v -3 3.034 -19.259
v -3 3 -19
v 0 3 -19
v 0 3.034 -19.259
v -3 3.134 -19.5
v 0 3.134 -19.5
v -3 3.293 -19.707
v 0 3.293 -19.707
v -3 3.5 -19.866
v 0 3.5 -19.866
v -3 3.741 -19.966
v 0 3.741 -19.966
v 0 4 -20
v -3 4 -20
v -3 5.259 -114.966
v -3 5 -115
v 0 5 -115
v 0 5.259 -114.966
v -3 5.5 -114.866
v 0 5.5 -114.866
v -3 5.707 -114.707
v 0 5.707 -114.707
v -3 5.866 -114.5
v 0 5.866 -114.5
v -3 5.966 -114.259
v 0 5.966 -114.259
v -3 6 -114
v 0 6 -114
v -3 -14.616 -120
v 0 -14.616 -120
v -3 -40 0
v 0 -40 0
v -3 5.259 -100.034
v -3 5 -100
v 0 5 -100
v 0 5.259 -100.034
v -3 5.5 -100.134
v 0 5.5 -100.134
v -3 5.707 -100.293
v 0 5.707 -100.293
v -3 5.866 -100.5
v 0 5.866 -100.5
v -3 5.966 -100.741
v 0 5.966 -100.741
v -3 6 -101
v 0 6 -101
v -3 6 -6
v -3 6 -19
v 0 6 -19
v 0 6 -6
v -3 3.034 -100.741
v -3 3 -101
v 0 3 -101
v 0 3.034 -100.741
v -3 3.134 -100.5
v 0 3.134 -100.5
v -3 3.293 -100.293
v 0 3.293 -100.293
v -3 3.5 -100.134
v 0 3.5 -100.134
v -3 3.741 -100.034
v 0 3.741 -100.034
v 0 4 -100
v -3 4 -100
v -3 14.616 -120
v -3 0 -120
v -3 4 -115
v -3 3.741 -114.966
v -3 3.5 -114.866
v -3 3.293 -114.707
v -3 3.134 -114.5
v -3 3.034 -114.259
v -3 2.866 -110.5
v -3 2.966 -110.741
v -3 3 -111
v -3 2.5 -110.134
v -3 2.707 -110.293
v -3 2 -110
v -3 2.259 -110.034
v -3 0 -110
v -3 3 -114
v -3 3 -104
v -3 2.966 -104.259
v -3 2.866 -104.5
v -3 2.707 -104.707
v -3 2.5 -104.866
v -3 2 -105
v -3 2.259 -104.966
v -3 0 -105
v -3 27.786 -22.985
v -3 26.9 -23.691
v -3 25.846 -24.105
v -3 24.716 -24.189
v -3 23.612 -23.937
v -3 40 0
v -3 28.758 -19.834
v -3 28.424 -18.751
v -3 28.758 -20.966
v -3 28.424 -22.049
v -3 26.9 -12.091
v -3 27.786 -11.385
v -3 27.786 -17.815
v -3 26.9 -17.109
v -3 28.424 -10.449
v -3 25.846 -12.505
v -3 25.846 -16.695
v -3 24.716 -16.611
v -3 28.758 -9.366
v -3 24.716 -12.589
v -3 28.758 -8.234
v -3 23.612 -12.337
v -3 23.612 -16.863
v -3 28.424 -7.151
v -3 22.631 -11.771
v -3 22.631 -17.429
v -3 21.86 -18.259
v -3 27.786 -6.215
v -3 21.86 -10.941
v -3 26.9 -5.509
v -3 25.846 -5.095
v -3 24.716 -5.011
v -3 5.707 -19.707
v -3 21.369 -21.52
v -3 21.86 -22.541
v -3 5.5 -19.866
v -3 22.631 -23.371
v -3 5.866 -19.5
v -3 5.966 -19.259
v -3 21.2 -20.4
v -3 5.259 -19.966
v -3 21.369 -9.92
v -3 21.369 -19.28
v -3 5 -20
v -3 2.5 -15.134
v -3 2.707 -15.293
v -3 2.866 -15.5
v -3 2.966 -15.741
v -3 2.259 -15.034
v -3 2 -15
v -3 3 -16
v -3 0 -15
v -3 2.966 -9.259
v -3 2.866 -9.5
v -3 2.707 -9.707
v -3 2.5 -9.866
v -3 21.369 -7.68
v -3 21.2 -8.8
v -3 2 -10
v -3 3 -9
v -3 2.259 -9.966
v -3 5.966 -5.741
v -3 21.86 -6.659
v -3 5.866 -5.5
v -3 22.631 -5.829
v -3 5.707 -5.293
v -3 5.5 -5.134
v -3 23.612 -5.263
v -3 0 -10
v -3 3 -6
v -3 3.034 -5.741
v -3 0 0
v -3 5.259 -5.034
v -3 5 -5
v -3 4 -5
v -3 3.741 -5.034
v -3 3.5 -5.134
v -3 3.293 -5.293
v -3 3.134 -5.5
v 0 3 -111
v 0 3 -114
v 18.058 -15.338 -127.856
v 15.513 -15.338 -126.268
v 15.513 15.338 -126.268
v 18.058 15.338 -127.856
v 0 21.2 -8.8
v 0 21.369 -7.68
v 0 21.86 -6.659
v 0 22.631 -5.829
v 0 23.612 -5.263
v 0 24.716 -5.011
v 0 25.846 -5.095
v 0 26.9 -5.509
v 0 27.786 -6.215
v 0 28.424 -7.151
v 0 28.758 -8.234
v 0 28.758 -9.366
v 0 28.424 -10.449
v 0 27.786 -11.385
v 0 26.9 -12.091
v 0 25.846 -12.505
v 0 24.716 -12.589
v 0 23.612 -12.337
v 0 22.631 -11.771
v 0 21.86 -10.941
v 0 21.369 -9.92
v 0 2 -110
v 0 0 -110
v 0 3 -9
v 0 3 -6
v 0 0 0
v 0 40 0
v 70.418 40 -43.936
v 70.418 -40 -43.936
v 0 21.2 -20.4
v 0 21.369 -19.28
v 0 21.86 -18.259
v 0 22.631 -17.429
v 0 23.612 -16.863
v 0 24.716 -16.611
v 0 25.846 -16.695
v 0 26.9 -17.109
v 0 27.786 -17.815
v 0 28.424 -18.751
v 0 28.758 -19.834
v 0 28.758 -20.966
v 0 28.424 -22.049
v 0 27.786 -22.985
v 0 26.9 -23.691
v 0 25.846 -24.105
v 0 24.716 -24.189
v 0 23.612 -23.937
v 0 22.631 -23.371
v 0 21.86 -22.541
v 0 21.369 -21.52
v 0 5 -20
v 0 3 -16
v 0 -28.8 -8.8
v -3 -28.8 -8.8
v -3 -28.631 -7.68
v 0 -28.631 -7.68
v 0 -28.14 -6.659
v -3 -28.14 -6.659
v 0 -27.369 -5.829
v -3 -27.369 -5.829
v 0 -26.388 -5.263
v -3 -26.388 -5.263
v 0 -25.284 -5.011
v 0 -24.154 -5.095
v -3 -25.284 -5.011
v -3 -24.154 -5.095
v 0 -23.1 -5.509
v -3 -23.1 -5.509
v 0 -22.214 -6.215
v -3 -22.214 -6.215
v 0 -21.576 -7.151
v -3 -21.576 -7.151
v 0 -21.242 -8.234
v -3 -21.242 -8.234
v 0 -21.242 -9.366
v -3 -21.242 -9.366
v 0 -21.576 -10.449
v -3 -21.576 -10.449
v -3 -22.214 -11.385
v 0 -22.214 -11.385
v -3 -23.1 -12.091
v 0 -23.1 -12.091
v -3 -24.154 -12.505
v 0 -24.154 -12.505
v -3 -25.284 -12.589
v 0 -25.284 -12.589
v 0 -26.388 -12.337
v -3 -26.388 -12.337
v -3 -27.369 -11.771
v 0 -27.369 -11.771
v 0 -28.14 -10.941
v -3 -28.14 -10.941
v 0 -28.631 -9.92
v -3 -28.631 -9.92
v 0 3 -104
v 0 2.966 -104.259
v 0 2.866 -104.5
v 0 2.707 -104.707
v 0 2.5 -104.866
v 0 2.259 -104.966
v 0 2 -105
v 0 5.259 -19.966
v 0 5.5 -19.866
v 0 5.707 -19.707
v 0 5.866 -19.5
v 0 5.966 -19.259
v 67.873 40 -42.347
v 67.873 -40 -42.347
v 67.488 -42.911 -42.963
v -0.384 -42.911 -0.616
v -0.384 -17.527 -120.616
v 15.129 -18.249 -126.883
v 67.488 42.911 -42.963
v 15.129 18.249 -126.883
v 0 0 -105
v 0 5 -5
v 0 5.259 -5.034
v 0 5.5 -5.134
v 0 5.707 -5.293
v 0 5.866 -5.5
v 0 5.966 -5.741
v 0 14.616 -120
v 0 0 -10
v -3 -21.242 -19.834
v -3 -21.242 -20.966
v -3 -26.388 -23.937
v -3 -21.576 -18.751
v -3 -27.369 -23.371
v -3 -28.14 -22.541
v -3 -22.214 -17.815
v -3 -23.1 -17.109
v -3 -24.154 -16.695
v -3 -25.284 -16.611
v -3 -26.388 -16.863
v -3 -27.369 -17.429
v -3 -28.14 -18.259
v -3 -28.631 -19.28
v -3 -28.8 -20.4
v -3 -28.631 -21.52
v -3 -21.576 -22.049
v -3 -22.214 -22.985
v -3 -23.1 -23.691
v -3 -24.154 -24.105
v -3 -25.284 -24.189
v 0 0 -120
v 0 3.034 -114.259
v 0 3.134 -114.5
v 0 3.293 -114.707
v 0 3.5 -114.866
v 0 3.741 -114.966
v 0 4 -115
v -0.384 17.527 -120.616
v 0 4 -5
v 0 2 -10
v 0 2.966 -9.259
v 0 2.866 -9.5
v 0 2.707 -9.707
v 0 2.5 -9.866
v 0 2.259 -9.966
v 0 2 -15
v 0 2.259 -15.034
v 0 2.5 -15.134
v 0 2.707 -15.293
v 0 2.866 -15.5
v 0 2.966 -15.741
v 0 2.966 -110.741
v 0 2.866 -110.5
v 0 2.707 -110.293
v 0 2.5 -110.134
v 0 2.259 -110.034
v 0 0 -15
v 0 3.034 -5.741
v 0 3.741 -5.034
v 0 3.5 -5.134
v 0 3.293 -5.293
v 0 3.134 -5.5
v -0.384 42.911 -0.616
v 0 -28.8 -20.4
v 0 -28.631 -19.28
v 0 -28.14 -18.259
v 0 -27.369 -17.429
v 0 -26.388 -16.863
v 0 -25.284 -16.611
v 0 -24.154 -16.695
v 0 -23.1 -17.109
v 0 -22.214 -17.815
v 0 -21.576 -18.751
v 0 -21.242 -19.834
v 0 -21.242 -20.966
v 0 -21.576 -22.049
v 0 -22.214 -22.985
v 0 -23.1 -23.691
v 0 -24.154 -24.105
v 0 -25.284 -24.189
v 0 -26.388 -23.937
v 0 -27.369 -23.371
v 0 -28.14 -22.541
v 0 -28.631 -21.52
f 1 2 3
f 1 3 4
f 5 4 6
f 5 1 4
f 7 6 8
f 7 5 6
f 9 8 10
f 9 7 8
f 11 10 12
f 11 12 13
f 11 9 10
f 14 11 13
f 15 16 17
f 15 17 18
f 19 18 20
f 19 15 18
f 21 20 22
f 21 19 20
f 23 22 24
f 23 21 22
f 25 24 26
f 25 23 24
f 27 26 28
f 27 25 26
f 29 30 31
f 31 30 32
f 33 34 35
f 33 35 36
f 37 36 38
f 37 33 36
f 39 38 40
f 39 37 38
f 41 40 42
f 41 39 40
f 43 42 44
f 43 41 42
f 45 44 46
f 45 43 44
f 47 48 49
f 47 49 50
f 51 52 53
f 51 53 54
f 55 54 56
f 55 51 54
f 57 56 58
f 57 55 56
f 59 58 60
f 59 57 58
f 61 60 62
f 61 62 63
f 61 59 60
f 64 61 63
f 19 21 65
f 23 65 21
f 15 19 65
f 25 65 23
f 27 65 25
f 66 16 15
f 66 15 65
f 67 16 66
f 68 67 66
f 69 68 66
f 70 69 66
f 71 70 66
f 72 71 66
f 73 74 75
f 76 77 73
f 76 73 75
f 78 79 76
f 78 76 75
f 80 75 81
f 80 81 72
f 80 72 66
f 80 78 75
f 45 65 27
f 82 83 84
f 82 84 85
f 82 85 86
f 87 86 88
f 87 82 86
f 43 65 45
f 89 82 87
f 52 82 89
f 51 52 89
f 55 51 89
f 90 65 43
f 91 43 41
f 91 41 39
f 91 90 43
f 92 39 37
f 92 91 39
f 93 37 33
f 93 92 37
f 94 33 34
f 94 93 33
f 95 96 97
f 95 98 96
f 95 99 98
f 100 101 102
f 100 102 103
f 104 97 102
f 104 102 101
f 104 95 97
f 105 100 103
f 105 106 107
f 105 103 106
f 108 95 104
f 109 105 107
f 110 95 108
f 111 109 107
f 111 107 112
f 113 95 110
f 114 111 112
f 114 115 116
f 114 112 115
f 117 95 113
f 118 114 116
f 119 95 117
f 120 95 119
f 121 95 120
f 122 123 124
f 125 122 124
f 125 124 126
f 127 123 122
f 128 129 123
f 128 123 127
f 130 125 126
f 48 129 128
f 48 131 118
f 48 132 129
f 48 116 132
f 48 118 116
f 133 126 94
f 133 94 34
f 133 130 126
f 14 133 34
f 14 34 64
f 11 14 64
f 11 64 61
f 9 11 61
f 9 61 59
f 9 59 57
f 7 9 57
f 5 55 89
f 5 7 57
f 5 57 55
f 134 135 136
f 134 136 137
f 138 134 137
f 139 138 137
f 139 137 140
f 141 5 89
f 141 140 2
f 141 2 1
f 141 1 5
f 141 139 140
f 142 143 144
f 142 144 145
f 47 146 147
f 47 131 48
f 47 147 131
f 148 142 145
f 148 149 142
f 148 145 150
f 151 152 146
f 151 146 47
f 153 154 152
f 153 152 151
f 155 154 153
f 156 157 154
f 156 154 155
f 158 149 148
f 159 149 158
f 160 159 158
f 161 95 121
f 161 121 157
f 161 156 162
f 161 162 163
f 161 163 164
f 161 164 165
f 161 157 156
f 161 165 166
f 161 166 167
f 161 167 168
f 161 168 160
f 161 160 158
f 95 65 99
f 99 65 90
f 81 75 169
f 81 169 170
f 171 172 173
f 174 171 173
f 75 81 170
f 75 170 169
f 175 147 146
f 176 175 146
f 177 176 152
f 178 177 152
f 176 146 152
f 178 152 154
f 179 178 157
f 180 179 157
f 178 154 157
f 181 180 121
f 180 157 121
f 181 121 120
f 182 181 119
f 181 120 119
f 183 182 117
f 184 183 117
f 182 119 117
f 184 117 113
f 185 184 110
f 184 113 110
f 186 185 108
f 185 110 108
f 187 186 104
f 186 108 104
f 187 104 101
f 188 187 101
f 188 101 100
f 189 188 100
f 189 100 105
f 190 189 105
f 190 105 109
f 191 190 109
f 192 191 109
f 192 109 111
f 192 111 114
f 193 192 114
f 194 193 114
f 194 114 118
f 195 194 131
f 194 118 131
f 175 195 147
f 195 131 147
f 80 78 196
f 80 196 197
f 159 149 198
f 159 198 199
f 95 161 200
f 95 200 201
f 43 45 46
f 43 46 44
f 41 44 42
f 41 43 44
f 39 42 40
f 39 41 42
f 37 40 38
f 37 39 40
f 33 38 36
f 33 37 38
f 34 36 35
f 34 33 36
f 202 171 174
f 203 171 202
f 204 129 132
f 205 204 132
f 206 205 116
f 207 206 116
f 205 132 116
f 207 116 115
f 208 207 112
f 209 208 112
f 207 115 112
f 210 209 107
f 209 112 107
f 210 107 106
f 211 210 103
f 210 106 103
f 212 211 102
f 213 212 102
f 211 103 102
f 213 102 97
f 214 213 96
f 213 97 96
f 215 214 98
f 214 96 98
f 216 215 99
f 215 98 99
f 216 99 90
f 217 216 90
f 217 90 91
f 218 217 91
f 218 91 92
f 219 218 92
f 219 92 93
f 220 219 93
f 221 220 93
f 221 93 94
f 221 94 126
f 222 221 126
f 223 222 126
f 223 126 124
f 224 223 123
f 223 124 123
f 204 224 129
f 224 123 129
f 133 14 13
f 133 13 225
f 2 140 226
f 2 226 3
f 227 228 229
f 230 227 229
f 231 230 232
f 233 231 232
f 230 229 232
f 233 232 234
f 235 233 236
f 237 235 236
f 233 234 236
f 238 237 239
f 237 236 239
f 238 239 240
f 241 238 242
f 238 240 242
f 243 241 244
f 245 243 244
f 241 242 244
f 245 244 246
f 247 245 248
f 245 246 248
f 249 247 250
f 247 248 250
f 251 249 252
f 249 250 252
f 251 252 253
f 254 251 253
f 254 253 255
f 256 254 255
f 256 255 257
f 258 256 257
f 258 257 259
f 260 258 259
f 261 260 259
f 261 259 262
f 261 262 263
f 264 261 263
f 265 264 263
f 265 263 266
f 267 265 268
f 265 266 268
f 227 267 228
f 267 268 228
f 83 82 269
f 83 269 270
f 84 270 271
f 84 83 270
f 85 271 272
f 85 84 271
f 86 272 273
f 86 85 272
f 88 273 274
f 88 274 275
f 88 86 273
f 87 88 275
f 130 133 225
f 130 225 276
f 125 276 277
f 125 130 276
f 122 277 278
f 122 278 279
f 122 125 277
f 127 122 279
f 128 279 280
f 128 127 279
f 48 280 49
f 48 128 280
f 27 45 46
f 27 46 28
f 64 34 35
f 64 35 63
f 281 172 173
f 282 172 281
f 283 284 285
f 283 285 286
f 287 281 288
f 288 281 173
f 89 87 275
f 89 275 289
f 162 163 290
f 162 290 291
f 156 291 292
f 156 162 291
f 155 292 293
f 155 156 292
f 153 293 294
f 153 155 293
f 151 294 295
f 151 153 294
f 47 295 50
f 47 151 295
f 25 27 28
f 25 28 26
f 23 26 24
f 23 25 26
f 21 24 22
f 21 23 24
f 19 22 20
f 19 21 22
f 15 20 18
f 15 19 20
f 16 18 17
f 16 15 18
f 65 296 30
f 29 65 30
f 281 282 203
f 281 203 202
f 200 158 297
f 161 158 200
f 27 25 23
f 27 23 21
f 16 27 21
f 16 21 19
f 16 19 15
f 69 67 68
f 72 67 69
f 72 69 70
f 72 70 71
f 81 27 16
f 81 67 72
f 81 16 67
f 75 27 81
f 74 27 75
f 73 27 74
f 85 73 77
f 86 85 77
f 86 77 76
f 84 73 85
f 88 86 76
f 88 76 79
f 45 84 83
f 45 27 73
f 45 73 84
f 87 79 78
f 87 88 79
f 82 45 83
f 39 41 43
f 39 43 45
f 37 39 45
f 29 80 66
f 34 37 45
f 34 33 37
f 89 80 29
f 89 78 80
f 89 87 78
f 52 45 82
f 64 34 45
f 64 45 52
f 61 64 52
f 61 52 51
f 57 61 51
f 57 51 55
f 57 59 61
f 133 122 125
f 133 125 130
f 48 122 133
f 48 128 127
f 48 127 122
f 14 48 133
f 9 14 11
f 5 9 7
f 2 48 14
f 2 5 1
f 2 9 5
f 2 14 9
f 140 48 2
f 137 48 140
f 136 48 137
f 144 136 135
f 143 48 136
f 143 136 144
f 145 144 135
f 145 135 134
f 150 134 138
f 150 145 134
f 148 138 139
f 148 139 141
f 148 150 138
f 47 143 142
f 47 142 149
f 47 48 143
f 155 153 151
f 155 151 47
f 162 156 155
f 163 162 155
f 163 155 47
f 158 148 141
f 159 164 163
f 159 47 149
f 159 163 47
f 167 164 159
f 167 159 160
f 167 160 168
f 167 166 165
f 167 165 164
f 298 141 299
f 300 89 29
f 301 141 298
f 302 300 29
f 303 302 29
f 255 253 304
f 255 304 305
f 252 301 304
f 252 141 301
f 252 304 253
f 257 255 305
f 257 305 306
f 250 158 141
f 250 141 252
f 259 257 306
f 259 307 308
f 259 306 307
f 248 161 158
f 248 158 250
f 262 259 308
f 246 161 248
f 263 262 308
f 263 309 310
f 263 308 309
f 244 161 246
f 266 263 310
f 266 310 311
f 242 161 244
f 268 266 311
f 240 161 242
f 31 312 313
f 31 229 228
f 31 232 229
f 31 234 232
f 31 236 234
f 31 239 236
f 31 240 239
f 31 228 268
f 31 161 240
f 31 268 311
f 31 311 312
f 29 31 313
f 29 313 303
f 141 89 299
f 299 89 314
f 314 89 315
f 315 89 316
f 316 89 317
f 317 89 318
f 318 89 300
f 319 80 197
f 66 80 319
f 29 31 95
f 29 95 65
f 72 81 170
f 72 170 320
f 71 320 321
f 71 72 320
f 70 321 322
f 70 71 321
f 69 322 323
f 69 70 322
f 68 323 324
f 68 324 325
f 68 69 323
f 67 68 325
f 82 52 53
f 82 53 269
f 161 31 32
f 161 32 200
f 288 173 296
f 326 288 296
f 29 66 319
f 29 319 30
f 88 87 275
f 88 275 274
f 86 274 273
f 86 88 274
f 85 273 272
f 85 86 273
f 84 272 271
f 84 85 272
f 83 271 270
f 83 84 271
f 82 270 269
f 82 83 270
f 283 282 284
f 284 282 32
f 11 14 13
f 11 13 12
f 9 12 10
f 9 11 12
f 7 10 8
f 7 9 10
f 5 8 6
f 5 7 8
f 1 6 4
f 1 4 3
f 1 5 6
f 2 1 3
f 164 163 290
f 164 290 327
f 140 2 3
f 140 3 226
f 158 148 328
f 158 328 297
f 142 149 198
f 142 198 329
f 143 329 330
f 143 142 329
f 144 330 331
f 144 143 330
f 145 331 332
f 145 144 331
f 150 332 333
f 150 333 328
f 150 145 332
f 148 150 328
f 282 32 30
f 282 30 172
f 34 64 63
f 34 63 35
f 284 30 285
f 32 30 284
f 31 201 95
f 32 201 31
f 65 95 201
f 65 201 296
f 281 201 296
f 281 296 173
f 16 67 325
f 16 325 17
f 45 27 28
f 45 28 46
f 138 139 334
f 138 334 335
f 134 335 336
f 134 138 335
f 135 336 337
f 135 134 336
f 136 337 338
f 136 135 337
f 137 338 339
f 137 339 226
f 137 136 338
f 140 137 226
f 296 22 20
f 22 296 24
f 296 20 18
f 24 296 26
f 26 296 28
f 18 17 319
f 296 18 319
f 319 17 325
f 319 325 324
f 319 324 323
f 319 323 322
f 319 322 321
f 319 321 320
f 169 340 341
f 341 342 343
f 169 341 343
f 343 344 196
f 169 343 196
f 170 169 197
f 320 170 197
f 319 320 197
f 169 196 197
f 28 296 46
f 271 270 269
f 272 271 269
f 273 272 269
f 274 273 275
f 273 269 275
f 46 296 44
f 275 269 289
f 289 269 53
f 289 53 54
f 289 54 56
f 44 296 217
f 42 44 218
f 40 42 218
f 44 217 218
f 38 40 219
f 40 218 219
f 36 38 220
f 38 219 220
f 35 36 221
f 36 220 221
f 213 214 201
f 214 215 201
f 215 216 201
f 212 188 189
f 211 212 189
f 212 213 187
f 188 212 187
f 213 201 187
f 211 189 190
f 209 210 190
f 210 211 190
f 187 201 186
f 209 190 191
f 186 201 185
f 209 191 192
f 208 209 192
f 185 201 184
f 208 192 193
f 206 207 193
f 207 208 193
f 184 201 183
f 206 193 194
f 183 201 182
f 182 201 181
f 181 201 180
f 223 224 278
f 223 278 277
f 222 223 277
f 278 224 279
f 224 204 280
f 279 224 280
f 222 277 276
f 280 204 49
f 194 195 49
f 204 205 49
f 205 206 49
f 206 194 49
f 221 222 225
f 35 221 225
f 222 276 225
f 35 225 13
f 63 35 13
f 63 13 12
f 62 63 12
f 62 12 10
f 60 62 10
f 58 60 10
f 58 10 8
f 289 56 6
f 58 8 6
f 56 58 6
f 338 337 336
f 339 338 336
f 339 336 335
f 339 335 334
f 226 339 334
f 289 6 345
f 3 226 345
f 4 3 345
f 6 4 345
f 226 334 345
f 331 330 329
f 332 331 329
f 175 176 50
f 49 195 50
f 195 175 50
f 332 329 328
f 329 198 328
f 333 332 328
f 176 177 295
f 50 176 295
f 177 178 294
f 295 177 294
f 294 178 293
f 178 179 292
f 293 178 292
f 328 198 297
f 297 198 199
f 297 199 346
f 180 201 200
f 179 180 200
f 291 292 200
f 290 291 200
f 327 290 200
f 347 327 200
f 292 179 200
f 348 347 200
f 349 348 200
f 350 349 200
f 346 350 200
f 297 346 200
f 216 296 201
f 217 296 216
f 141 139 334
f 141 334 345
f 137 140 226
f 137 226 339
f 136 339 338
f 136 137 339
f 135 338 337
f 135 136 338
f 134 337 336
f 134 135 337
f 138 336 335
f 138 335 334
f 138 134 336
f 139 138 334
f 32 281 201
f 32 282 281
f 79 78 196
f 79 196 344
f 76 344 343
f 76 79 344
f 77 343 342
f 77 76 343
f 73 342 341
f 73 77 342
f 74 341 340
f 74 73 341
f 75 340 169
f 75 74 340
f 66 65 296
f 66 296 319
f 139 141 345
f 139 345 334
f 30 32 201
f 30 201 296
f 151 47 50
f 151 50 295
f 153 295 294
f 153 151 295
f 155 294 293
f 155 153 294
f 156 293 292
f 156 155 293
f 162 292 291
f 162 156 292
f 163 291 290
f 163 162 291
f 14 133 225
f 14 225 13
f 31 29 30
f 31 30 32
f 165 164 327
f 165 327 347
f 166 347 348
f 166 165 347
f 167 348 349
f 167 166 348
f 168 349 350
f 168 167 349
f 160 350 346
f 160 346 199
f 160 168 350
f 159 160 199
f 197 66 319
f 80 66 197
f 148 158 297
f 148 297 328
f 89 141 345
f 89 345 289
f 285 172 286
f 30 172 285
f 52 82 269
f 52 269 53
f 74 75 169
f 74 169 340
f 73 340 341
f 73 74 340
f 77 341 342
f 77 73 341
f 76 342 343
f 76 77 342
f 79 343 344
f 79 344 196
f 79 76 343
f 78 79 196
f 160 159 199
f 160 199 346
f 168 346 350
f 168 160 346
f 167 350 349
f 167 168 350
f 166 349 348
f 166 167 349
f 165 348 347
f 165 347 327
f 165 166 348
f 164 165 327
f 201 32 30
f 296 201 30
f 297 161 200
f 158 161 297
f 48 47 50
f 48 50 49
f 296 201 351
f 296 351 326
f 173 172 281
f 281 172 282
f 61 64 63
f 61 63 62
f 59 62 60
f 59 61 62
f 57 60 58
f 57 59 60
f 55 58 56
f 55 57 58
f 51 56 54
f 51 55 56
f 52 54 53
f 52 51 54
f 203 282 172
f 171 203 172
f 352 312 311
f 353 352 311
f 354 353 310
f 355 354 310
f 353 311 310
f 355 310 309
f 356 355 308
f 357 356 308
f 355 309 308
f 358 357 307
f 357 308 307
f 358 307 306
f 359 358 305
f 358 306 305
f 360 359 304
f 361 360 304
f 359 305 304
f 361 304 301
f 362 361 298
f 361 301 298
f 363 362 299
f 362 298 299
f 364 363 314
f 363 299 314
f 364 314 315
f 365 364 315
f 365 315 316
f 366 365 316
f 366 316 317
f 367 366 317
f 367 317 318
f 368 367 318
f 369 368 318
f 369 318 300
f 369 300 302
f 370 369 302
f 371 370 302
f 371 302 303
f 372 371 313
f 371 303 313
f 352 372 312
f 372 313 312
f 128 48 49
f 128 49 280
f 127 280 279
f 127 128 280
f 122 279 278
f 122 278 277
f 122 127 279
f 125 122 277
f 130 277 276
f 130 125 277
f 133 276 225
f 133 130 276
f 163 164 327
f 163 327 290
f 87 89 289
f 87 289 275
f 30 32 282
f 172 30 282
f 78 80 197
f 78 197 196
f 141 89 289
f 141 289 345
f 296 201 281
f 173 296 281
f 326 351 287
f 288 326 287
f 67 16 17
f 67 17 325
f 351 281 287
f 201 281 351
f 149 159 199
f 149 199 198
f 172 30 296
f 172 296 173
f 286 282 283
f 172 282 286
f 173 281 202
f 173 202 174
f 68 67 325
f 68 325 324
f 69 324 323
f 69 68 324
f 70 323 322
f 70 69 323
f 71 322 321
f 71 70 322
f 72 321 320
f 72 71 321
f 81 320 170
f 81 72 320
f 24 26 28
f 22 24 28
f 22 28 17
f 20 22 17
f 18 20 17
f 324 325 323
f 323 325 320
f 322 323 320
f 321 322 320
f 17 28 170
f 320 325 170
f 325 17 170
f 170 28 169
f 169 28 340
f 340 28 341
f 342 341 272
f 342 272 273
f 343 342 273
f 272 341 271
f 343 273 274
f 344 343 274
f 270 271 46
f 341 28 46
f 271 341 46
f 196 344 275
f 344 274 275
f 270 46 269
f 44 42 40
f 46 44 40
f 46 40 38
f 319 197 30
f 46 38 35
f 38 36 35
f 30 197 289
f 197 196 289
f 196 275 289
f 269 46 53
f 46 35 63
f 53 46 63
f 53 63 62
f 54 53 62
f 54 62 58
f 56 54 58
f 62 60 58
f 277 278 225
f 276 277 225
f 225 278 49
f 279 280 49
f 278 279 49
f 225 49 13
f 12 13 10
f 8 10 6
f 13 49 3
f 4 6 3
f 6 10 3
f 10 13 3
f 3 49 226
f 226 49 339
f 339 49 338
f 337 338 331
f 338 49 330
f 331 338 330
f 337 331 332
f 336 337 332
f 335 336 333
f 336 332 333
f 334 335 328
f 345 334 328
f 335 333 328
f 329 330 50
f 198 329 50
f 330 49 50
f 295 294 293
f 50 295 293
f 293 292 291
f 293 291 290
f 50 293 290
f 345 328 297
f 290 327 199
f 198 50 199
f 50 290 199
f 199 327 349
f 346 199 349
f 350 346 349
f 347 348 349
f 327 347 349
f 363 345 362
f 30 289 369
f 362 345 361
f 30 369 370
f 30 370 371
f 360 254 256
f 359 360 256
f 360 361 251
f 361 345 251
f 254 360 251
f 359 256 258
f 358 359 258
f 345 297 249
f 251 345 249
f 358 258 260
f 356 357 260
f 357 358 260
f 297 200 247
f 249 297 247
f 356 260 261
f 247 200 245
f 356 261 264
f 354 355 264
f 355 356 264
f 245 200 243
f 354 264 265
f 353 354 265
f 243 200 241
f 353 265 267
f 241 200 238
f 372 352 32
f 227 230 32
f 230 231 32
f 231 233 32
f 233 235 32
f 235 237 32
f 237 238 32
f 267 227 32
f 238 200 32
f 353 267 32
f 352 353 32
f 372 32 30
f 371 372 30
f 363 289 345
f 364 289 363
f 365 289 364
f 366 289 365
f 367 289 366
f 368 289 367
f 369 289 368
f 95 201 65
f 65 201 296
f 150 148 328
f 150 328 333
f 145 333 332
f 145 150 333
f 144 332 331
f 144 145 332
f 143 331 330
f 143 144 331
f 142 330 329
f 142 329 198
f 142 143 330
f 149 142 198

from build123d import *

# Parameters (mm, degrees)
F4_DEPTH  = 40
F7_DEPTH  = 50
F10_DEPTH = 50
F11_DEPTH = 3
F12_DEPTH = 3
F13_DEPTH = 3
F14_DEPTH = 3
F15_R     = 3.8
F16_DEPTH = 3
F17_DEPTH = 3


with BuildPart() as f4:
    # F3 (on Front) → F4 (new body, symmetric)
    with BuildSketch(Plane.XZ):
        Polygon((67.8726110647, -42.3474753351), (0, 0), (0, -120), (15.5127130708, -126.2675429144), align=None)
    extrude(amount=F4_DEPTH, both=True)

    # F6 (on face) → F7 (cut)
    with BuildSketch(Plane(origin=(-4.9702338564, 37.6589518572, -7.9660651967), x_dir=(0.9917664521, 0.1252874063, -0.0265022683), z_dir=(0.1280597688, -0.9702957263, 0.2052483841))):
        Polygon((91.8436139113, 10.6302635931), (5.0114962506, 8.2780934425), (5.0114962506, -139.7075390252), (95.8494145084, -137.2468568995), align=None)
    extrude(amount=-F7_DEPTH, mode=Mode.SUBTRACT)

    # F9 (on face) → F10 (cut)
    with BuildSketch(Plane(origin=(-4.9702338564, -37.6589518572, -7.9660651967), x_dir=(0.9917664521, -0.1252874063, -0.0265022683), z_dir=(-0.1280597688, -0.9702957263, -0.2052483841))):
        Polygon((94.1713751602, 9.5739853333), (5.0114962506, 8.2780934425), (-8.5428429474, -135.8194760247), (96.262452346, -134.2961862453), align=None)
    extrude(amount=F10_DEPTH, mode=Mode.SUBTRACT)


with BuildPart() as f11:
    # F11 (new): a face of the model
    f11_faces = [f4.part.faces().sort_by_distance(p)[0] for p in [
        (23.4864853616, 30.1678668079, -61.1344676725),
    ]]
    extrude(f11_faces, amount=F11_DEPTH)


with BuildPart() as f12:
    # F12 (new): a face of the model
    f12_faces = [f4.part.faces().sort_by_distance(p)[0] for p in [
        (0, 0, -50.7046552919),
    ]]
    extrude(f12_faces, amount=F12_DEPTH)


with BuildPart() as f13:
    # F13 (new): a face of the model
    f13_faces = [f4.part.faces().sort_by_distance(p)[0] for p in [
        (23.4864853616, -30.1678668079, -61.1344676725),
    ]]
    extrude(f13_faces, amount=F13_DEPTH)


with BuildPart() as f14:
    # F14 (new): a face of the model
    f14_faces = [f4.part.faces().sort_by_distance(p)[0] for p in [
        (45.5818433529, 0, -78.0741059138),
    ]]
    extrude(f14_faces, amount=F14_DEPTH)


with BuildPart() as f16:
    # F15 (on face) → F16 (new body)
    with BuildSketch(Plane(origin=(-3, 0, 0), x_dir=(0, -1, 0), z_dir=(-1, 0, 0))):
        Polygon((0, -110), (0, -120), (14.6161861532, -120), (40, 0), (0, 0), (0, -10), (0, -15), (0, -105), align=None)
        with Locations((25, -20.4)):
            Circle(F15_R, mode=Mode.SUBTRACT)
        with Locations((25, -8.8)):
            Circle(F15_R, mode=Mode.SUBTRACT)
        with BuildLine():
            Line((-2, -15), (0, -15))
            Line((0, -15), (0, -10))
            Line((0, -10), (-2, -10))
            ThreePointArc((-2, -10), (-2.7071067812, -9.7071067812), (-3, -9))
            Line((-3, -9), (-3, -6))
            ThreePointArc((-3, -6), (-3.2928932188, -5.2928932188), (-4, -5))
            Line((-4, -5), (-5, -5))
            ThreePointArc((-5, -5), (-5.7071067812, -5.2928932188), (-6, -6))
            Line((-6, -6), (-6, -19))
            ThreePointArc((-6, -19), (-5.7071067812, -19.7071067812), (-5, -20))
            Line((-5, -20), (-4, -20))
            ThreePointArc((-4, -20), (-3.2928932188, -19.7071067812), (-3, -19))
            Line((-3, -19), (-3, -16))
            ThreePointArc((-3, -16), (-2.7071067812, -15.2928932188), (-2, -15))
        make_face()
        with BuildLine():
            Line((-2, -110), (0, -110))
            Line((0, -110), (0, -105))
            Line((0, -105), (-2, -105))
            ThreePointArc((-2, -105), (-2.7071067812, -104.7071067812), (-3, -104))
            Line((-3, -104), (-3, -101))
            ThreePointArc((-3, -101), (-3.2928932188, -100.2928932188), (-4, -100))
            Line((-4, -100), (-5, -100))
            ThreePointArc((-5, -100), (-5.7071067812, -100.2928932188), (-6, -101))
            Line((-6, -101), (-6, -114))
            ThreePointArc((-6, -114), (-5.7071067812, -114.7071067812), (-5, -115))
            Line((-5, -115), (-4, -115))
            ThreePointArc((-4, -115), (-3.2928932188, -114.7071067812), (-3, -114))
            Line((-3, -114), (-3, -111))
            ThreePointArc((-3, -111), (-2.7071067812, -110.2928932188), (-2, -110))
        make_face()
    extrude(amount=-F16_DEPTH)


with BuildPart() as f17:
    # F15 (on face) → F17 (new body)
    with BuildSketch(Plane(origin=(-3, 0, 0), x_dir=(0, -1, 0), z_dir=(-1, 0, 0))):
        with BuildLine():
            Line((-14.6161861532, -120), (0, -120))
            Line((0, -120), (0, -110))
            Line((0, -110), (-2, -110))
            ThreePointArc((-2, -110), (-2.7071067812, -110.2928932188), (-3, -111))
            Line((-3, -111), (-3, -114))
            ThreePointArc((-3, -114), (-3.2928932188, -114.7071067812), (-4, -115))
            Line((-4, -115), (-5, -115))
            ThreePointArc((-5, -115), (-5.7071067812, -114.7071067812), (-6, -114))
            Line((-6, -114), (-6, -101))
            ThreePointArc((-6, -101), (-5.7071067812, -100.2928932188), (-5, -100))
            Line((-5, -100), (-4, -100))
            ThreePointArc((-4, -100), (-3.2928932188, -100.2928932188), (-3, -101))
            Line((-3, -101), (-3, -104))
            ThreePointArc((-3, -104), (-2.7071067812, -104.7071067812), (-2, -105))
            Line((-2, -105), (0, -105))
            Line((0, -105), (0, -15))
            Line((0, -15), (-2, -15))
            ThreePointArc((-2, -15), (-2.7071067812, -15.2928932188), (-3, -16))
            Line((-3, -16), (-3, -19))
            ThreePointArc((-3, -19), (-3.2928932188, -19.7071067812), (-4, -20))
            Line((-4, -20), (-5, -20))
            ThreePointArc((-5, -20), (-5.7071067812, -19.7071067812), (-6, -19))
            Line((-6, -19), (-6, -6))
            ThreePointArc((-6, -6), (-5.7071067812, -5.2928932188), (-5, -5))
            Line((-5, -5), (-4, -5))
            ThreePointArc((-4, -5), (-3.2928932188, -5.2928932188), (-3, -6))
            Line((-3, -6), (-3, -9))
            ThreePointArc((-3, -9), (-2.7071067812, -9.7071067812), (-2, -10))
            Line((-2, -10), (0, -10))
            Line((0, -10), (0, 0))
            Line((0, 0), (-40, 0))
            Line((-40, 0), (-14.6161861532, -120))
        make_face()
        with Locations((-25, -20.4)):
            Circle(F15_R, mode=Mode.SUBTRACT)
        with Locations((-25, -8.8)):
            Circle(F15_R, mode=Mode.SUBTRACT)
    extrude(amount=-F17_DEPTH)


solid = Compound([f4.part, f11.part, f12.part, f13.part, f14.part, f16.part, f17.part])
